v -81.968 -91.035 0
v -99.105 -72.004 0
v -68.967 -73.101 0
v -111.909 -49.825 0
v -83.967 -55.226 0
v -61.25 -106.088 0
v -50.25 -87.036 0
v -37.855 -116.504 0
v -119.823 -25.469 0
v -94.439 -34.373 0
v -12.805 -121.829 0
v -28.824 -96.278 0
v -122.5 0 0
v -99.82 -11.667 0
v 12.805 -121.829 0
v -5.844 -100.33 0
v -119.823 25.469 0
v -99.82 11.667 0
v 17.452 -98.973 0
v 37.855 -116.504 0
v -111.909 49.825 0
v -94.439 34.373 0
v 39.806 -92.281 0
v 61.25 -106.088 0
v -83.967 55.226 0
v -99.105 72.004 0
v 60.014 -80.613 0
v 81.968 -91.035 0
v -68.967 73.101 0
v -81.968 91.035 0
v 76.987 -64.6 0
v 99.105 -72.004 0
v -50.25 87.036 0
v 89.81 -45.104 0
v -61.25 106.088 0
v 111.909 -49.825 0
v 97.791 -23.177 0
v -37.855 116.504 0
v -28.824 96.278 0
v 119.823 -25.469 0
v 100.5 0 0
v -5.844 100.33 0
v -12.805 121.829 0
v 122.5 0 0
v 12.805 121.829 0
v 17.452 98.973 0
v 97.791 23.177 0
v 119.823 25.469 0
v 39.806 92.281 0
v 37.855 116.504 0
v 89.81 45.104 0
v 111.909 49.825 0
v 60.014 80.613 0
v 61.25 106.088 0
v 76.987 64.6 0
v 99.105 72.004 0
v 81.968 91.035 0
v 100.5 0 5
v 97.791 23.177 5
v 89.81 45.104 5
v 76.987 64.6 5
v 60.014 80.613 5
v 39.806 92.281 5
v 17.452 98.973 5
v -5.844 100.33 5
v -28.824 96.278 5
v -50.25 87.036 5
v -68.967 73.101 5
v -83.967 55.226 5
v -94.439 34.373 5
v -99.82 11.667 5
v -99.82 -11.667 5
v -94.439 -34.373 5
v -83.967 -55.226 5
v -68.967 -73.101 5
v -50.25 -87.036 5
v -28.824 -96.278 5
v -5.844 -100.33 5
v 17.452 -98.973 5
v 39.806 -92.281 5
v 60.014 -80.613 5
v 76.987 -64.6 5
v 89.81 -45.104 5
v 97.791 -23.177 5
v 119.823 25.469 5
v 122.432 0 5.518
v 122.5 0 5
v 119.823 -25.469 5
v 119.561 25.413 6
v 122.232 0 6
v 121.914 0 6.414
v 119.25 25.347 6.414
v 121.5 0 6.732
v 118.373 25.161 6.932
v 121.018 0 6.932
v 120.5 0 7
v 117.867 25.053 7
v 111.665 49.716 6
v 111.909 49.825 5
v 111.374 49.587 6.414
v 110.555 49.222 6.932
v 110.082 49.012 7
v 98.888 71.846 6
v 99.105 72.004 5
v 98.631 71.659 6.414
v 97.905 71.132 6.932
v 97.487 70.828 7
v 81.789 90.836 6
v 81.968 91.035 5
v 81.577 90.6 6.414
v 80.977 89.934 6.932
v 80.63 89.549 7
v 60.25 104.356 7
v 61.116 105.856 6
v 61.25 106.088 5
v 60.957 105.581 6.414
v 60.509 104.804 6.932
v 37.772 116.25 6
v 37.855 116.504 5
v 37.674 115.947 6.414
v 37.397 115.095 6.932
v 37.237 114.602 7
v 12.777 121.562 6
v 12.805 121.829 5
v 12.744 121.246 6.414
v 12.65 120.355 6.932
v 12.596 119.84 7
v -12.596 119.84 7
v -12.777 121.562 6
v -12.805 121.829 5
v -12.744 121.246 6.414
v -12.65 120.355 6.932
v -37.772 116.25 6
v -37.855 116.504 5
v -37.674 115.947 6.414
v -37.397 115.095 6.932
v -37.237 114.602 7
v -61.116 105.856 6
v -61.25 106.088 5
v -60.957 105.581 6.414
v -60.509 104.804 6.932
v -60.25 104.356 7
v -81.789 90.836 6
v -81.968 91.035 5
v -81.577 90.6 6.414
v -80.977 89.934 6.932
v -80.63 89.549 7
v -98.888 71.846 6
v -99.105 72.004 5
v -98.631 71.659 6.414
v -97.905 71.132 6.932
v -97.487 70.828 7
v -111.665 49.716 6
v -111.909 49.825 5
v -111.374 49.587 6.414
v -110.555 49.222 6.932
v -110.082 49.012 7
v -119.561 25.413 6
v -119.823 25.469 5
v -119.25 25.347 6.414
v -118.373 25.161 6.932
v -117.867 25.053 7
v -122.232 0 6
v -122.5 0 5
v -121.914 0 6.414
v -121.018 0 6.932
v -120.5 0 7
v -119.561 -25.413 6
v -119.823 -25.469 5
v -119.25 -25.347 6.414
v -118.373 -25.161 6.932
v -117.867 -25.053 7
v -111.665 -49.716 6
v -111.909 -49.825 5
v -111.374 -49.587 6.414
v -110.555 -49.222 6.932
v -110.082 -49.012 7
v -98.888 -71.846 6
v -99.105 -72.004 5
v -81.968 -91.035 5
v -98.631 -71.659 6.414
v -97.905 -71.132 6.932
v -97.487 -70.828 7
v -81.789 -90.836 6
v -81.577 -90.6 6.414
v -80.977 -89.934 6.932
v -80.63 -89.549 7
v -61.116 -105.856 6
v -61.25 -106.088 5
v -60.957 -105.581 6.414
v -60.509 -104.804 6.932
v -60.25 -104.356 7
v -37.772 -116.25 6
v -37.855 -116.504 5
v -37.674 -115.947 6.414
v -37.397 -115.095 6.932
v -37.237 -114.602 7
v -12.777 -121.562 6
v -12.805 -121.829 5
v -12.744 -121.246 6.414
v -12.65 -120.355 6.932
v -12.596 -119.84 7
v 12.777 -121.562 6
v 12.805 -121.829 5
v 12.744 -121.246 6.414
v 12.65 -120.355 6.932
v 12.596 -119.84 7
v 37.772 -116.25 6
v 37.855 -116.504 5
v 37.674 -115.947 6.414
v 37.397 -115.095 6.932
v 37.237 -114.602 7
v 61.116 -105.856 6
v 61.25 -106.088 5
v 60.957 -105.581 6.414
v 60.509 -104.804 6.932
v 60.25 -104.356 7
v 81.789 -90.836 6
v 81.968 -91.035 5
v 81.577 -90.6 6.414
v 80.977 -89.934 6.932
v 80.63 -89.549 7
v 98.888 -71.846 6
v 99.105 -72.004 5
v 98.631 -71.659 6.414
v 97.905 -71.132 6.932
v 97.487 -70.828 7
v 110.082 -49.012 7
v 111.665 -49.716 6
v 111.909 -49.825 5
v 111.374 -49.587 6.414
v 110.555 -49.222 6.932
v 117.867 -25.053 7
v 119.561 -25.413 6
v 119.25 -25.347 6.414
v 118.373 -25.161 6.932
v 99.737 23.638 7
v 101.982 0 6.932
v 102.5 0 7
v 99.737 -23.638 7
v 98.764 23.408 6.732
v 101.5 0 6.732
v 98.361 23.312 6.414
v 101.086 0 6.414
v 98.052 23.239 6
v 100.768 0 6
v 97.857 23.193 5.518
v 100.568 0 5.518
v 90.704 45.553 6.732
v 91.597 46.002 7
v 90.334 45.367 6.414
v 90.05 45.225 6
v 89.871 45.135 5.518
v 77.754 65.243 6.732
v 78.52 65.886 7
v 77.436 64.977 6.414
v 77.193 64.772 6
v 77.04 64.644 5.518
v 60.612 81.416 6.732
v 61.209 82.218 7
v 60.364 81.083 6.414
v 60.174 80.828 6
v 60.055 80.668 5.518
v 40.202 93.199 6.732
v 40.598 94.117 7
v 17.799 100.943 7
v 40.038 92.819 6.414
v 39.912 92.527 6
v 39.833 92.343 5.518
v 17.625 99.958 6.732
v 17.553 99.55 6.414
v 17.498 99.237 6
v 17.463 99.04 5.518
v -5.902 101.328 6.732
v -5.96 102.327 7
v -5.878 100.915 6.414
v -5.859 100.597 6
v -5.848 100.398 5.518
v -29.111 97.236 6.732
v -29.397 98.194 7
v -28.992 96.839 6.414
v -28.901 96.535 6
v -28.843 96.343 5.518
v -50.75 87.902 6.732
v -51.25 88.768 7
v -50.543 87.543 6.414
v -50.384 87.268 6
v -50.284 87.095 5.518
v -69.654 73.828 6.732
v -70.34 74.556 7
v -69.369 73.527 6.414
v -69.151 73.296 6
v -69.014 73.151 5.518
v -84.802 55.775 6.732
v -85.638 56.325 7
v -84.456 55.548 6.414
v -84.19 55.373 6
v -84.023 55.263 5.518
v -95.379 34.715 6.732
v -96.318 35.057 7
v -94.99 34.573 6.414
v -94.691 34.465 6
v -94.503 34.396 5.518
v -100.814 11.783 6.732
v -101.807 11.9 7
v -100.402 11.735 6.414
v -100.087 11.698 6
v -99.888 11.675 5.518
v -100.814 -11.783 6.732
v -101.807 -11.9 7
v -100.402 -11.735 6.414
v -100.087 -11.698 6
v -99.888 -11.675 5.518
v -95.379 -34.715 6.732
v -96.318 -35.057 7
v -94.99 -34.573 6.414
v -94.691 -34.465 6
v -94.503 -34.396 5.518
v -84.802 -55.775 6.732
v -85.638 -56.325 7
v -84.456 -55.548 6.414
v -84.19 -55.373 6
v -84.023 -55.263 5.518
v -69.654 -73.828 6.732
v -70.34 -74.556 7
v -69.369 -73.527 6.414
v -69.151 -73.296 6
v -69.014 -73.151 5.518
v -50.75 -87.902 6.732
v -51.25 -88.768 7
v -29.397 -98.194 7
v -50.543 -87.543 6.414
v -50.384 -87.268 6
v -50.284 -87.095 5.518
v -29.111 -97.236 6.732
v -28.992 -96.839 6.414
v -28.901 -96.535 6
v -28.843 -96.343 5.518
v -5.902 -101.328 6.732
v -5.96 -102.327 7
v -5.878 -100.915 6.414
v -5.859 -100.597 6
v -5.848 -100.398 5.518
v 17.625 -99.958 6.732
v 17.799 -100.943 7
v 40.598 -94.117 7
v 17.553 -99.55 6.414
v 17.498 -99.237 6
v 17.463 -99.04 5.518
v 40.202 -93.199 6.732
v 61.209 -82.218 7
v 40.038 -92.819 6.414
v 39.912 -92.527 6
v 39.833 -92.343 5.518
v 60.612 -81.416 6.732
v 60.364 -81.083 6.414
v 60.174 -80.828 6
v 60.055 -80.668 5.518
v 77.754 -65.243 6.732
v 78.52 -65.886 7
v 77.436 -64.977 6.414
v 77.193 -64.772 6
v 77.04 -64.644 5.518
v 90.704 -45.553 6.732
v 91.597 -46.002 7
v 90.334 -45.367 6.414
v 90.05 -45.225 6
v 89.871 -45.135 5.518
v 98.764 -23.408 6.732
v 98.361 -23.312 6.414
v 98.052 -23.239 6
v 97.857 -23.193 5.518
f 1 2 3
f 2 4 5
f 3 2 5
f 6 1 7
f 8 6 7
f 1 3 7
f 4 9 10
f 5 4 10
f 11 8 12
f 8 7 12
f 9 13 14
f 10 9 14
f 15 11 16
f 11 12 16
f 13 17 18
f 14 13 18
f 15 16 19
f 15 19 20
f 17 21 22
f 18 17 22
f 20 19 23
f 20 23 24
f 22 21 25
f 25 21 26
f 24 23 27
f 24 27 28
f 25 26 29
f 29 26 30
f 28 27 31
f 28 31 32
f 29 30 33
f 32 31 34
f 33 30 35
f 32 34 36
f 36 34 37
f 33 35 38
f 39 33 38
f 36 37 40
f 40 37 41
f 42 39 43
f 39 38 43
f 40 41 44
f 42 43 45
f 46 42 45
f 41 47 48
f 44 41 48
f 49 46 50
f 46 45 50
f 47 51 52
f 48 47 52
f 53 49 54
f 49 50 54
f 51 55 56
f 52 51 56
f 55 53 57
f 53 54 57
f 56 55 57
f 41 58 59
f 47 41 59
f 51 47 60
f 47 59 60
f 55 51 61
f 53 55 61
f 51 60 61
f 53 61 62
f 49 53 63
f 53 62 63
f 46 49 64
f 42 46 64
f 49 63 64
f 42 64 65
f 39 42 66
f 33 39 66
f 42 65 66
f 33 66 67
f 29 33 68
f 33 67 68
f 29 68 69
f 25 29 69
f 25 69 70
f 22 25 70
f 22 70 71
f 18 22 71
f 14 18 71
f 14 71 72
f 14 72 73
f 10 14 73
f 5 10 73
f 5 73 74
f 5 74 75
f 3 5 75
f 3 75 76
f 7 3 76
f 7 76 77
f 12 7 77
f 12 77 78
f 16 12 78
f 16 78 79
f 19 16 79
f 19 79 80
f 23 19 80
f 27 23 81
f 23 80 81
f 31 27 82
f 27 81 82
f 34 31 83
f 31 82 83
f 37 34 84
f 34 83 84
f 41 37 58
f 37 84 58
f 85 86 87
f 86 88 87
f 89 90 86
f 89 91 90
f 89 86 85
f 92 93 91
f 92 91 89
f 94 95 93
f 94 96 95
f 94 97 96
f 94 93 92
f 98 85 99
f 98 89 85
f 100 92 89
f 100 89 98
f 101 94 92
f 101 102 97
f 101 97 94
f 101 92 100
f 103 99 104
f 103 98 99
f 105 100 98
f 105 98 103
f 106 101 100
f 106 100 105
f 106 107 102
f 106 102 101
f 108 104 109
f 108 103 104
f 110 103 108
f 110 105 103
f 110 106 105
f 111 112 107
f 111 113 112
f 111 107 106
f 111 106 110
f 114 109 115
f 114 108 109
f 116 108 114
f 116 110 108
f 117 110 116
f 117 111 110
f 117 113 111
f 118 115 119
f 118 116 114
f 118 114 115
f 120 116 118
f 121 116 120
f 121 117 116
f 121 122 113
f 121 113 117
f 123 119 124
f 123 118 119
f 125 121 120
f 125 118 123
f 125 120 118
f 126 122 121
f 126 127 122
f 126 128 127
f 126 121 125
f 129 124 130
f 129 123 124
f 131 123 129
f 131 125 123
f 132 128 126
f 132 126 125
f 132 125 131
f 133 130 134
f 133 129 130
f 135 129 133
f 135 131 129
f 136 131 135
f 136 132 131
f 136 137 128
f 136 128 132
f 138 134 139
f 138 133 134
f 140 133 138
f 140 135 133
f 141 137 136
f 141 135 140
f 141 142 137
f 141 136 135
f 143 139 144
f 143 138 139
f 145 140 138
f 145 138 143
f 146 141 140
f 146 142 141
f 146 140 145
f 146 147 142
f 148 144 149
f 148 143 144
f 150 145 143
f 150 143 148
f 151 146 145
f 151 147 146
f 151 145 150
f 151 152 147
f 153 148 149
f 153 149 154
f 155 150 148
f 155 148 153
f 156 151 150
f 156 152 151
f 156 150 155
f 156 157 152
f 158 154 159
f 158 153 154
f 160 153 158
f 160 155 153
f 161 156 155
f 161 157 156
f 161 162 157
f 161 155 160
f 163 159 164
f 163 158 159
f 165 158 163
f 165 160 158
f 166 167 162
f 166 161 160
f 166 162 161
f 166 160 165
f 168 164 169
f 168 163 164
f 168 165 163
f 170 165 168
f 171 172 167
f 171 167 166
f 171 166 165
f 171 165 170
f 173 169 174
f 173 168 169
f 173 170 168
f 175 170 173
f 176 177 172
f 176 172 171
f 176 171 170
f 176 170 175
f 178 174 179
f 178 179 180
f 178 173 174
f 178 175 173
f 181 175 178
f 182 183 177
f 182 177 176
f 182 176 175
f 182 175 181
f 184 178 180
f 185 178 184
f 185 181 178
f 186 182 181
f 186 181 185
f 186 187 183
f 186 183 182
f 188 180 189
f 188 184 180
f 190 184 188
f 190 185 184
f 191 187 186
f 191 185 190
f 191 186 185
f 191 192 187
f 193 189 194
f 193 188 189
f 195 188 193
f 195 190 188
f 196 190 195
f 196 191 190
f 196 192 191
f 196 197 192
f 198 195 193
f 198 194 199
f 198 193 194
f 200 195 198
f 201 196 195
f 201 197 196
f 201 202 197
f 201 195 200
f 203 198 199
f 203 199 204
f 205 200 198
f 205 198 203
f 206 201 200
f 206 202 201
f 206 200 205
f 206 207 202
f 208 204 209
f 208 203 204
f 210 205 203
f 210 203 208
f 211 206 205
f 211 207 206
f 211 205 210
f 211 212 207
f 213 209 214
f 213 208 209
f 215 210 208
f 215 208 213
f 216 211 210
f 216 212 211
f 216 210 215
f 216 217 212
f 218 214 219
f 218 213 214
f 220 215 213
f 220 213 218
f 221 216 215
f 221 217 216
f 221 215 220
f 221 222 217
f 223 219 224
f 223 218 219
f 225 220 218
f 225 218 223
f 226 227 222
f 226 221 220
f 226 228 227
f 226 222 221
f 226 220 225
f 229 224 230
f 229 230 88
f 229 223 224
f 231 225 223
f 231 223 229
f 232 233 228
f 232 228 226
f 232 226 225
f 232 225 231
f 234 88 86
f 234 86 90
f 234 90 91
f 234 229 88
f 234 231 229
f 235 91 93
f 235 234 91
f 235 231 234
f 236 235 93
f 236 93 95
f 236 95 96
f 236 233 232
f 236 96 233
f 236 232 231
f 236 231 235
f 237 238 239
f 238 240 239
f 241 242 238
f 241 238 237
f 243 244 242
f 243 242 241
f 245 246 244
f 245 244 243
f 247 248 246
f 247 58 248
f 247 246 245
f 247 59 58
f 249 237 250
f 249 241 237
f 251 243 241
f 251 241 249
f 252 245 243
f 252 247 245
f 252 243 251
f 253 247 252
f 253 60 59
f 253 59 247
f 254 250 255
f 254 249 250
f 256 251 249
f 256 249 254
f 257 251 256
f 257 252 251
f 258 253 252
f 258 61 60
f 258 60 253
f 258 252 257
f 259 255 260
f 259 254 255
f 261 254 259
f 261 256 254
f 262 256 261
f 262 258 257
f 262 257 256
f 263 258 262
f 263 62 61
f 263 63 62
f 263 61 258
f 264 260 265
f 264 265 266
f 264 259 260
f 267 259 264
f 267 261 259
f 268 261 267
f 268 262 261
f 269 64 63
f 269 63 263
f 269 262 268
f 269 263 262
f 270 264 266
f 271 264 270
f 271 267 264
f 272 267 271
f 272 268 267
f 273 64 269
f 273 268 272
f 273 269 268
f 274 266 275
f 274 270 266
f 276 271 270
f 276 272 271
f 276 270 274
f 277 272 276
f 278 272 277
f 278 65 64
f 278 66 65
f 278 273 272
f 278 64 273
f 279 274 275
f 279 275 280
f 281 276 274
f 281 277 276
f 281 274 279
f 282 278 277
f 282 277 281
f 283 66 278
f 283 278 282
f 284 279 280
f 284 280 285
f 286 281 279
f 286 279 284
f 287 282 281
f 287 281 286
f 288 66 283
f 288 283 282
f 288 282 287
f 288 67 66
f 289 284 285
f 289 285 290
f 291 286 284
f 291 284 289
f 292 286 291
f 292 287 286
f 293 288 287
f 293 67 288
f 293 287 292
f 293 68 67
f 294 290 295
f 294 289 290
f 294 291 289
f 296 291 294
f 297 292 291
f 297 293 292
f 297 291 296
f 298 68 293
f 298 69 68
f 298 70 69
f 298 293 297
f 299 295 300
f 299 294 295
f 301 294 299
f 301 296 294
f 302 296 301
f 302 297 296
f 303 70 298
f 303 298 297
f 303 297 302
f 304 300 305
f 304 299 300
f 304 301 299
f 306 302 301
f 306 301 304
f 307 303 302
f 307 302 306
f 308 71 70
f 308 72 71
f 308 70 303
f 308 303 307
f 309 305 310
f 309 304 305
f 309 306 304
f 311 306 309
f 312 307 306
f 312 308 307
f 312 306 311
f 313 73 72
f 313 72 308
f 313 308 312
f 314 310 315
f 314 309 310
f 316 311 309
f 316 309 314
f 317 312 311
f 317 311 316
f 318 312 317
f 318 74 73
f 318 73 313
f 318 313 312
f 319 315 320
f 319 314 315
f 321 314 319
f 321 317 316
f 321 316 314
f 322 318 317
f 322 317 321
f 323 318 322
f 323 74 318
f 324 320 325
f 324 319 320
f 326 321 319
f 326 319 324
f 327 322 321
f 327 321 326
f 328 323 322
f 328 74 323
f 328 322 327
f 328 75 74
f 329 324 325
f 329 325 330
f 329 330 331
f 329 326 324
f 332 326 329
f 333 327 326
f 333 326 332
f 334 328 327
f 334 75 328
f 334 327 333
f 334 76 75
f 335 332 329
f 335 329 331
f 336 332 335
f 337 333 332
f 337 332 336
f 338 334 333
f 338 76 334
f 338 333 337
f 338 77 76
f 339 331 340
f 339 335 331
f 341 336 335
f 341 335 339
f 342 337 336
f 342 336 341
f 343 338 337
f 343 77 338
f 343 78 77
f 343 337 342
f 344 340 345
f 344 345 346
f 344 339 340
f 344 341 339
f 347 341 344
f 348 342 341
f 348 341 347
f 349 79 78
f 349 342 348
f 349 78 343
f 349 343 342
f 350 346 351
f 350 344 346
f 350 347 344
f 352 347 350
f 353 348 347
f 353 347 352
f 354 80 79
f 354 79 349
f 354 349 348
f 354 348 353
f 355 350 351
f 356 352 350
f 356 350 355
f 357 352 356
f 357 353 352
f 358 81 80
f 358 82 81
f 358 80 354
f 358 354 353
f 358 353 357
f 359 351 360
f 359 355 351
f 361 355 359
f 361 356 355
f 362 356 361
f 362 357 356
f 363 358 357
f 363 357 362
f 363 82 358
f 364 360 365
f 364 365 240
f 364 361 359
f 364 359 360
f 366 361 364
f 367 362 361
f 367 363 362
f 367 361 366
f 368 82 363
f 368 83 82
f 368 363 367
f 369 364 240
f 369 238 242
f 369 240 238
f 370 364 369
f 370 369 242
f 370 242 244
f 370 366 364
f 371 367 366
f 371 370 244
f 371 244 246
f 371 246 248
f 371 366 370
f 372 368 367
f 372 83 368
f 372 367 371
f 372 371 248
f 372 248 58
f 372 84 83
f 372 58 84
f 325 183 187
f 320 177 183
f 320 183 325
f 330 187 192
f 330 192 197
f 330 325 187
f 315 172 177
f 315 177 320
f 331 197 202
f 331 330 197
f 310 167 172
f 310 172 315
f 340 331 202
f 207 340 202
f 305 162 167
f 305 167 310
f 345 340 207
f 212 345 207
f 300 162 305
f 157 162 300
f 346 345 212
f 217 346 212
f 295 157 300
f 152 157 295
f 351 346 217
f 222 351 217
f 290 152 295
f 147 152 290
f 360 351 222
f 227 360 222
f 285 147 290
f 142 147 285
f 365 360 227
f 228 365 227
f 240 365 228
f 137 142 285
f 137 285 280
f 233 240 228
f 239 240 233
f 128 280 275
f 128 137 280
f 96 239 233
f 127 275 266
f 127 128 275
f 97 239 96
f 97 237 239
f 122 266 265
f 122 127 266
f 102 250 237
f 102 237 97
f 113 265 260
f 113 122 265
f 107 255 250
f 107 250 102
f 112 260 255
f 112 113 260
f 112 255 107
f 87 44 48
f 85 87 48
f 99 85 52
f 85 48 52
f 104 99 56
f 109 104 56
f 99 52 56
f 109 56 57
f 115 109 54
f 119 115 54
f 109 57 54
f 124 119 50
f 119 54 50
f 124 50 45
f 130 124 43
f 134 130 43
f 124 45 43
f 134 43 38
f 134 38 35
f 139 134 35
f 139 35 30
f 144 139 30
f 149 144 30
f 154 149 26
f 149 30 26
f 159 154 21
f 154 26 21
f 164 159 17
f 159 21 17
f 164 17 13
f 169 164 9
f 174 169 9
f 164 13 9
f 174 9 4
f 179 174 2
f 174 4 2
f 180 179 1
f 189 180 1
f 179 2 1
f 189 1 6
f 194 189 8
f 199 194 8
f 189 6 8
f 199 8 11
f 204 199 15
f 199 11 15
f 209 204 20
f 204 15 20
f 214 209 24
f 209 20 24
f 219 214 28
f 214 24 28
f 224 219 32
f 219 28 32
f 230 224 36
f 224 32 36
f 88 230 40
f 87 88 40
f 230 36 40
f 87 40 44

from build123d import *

# Parameters (mm, degrees)
F0_R     = 122.5
F1_DEPTH = 7
F2_R     = 100.5
F3_DEPTH = 25
F4_R     = 2


with BuildPart() as f1:
    # F0 (on Top) → F1 (new body)
    with BuildSketch(Plane.XY):
        Circle(F0_R)
    extrude(amount=F1_DEPTH)

    # F2 (on face) → F3 (cut)
    with BuildSketch(Plane.XY.offset(7)):
        Circle(F2_R)
    extrude(amount=-F3_DEPTH, mode=Mode.SUBTRACT)

    # F4
    f4_edges = [f1.edges().sort_by_distance(p)[0] for p in [
        (-122.5, 0, 7),
        (-100.5, 0, 7),
    ]]
    fillet(f4_edges, radius=F4_R)


solid = f1.part
